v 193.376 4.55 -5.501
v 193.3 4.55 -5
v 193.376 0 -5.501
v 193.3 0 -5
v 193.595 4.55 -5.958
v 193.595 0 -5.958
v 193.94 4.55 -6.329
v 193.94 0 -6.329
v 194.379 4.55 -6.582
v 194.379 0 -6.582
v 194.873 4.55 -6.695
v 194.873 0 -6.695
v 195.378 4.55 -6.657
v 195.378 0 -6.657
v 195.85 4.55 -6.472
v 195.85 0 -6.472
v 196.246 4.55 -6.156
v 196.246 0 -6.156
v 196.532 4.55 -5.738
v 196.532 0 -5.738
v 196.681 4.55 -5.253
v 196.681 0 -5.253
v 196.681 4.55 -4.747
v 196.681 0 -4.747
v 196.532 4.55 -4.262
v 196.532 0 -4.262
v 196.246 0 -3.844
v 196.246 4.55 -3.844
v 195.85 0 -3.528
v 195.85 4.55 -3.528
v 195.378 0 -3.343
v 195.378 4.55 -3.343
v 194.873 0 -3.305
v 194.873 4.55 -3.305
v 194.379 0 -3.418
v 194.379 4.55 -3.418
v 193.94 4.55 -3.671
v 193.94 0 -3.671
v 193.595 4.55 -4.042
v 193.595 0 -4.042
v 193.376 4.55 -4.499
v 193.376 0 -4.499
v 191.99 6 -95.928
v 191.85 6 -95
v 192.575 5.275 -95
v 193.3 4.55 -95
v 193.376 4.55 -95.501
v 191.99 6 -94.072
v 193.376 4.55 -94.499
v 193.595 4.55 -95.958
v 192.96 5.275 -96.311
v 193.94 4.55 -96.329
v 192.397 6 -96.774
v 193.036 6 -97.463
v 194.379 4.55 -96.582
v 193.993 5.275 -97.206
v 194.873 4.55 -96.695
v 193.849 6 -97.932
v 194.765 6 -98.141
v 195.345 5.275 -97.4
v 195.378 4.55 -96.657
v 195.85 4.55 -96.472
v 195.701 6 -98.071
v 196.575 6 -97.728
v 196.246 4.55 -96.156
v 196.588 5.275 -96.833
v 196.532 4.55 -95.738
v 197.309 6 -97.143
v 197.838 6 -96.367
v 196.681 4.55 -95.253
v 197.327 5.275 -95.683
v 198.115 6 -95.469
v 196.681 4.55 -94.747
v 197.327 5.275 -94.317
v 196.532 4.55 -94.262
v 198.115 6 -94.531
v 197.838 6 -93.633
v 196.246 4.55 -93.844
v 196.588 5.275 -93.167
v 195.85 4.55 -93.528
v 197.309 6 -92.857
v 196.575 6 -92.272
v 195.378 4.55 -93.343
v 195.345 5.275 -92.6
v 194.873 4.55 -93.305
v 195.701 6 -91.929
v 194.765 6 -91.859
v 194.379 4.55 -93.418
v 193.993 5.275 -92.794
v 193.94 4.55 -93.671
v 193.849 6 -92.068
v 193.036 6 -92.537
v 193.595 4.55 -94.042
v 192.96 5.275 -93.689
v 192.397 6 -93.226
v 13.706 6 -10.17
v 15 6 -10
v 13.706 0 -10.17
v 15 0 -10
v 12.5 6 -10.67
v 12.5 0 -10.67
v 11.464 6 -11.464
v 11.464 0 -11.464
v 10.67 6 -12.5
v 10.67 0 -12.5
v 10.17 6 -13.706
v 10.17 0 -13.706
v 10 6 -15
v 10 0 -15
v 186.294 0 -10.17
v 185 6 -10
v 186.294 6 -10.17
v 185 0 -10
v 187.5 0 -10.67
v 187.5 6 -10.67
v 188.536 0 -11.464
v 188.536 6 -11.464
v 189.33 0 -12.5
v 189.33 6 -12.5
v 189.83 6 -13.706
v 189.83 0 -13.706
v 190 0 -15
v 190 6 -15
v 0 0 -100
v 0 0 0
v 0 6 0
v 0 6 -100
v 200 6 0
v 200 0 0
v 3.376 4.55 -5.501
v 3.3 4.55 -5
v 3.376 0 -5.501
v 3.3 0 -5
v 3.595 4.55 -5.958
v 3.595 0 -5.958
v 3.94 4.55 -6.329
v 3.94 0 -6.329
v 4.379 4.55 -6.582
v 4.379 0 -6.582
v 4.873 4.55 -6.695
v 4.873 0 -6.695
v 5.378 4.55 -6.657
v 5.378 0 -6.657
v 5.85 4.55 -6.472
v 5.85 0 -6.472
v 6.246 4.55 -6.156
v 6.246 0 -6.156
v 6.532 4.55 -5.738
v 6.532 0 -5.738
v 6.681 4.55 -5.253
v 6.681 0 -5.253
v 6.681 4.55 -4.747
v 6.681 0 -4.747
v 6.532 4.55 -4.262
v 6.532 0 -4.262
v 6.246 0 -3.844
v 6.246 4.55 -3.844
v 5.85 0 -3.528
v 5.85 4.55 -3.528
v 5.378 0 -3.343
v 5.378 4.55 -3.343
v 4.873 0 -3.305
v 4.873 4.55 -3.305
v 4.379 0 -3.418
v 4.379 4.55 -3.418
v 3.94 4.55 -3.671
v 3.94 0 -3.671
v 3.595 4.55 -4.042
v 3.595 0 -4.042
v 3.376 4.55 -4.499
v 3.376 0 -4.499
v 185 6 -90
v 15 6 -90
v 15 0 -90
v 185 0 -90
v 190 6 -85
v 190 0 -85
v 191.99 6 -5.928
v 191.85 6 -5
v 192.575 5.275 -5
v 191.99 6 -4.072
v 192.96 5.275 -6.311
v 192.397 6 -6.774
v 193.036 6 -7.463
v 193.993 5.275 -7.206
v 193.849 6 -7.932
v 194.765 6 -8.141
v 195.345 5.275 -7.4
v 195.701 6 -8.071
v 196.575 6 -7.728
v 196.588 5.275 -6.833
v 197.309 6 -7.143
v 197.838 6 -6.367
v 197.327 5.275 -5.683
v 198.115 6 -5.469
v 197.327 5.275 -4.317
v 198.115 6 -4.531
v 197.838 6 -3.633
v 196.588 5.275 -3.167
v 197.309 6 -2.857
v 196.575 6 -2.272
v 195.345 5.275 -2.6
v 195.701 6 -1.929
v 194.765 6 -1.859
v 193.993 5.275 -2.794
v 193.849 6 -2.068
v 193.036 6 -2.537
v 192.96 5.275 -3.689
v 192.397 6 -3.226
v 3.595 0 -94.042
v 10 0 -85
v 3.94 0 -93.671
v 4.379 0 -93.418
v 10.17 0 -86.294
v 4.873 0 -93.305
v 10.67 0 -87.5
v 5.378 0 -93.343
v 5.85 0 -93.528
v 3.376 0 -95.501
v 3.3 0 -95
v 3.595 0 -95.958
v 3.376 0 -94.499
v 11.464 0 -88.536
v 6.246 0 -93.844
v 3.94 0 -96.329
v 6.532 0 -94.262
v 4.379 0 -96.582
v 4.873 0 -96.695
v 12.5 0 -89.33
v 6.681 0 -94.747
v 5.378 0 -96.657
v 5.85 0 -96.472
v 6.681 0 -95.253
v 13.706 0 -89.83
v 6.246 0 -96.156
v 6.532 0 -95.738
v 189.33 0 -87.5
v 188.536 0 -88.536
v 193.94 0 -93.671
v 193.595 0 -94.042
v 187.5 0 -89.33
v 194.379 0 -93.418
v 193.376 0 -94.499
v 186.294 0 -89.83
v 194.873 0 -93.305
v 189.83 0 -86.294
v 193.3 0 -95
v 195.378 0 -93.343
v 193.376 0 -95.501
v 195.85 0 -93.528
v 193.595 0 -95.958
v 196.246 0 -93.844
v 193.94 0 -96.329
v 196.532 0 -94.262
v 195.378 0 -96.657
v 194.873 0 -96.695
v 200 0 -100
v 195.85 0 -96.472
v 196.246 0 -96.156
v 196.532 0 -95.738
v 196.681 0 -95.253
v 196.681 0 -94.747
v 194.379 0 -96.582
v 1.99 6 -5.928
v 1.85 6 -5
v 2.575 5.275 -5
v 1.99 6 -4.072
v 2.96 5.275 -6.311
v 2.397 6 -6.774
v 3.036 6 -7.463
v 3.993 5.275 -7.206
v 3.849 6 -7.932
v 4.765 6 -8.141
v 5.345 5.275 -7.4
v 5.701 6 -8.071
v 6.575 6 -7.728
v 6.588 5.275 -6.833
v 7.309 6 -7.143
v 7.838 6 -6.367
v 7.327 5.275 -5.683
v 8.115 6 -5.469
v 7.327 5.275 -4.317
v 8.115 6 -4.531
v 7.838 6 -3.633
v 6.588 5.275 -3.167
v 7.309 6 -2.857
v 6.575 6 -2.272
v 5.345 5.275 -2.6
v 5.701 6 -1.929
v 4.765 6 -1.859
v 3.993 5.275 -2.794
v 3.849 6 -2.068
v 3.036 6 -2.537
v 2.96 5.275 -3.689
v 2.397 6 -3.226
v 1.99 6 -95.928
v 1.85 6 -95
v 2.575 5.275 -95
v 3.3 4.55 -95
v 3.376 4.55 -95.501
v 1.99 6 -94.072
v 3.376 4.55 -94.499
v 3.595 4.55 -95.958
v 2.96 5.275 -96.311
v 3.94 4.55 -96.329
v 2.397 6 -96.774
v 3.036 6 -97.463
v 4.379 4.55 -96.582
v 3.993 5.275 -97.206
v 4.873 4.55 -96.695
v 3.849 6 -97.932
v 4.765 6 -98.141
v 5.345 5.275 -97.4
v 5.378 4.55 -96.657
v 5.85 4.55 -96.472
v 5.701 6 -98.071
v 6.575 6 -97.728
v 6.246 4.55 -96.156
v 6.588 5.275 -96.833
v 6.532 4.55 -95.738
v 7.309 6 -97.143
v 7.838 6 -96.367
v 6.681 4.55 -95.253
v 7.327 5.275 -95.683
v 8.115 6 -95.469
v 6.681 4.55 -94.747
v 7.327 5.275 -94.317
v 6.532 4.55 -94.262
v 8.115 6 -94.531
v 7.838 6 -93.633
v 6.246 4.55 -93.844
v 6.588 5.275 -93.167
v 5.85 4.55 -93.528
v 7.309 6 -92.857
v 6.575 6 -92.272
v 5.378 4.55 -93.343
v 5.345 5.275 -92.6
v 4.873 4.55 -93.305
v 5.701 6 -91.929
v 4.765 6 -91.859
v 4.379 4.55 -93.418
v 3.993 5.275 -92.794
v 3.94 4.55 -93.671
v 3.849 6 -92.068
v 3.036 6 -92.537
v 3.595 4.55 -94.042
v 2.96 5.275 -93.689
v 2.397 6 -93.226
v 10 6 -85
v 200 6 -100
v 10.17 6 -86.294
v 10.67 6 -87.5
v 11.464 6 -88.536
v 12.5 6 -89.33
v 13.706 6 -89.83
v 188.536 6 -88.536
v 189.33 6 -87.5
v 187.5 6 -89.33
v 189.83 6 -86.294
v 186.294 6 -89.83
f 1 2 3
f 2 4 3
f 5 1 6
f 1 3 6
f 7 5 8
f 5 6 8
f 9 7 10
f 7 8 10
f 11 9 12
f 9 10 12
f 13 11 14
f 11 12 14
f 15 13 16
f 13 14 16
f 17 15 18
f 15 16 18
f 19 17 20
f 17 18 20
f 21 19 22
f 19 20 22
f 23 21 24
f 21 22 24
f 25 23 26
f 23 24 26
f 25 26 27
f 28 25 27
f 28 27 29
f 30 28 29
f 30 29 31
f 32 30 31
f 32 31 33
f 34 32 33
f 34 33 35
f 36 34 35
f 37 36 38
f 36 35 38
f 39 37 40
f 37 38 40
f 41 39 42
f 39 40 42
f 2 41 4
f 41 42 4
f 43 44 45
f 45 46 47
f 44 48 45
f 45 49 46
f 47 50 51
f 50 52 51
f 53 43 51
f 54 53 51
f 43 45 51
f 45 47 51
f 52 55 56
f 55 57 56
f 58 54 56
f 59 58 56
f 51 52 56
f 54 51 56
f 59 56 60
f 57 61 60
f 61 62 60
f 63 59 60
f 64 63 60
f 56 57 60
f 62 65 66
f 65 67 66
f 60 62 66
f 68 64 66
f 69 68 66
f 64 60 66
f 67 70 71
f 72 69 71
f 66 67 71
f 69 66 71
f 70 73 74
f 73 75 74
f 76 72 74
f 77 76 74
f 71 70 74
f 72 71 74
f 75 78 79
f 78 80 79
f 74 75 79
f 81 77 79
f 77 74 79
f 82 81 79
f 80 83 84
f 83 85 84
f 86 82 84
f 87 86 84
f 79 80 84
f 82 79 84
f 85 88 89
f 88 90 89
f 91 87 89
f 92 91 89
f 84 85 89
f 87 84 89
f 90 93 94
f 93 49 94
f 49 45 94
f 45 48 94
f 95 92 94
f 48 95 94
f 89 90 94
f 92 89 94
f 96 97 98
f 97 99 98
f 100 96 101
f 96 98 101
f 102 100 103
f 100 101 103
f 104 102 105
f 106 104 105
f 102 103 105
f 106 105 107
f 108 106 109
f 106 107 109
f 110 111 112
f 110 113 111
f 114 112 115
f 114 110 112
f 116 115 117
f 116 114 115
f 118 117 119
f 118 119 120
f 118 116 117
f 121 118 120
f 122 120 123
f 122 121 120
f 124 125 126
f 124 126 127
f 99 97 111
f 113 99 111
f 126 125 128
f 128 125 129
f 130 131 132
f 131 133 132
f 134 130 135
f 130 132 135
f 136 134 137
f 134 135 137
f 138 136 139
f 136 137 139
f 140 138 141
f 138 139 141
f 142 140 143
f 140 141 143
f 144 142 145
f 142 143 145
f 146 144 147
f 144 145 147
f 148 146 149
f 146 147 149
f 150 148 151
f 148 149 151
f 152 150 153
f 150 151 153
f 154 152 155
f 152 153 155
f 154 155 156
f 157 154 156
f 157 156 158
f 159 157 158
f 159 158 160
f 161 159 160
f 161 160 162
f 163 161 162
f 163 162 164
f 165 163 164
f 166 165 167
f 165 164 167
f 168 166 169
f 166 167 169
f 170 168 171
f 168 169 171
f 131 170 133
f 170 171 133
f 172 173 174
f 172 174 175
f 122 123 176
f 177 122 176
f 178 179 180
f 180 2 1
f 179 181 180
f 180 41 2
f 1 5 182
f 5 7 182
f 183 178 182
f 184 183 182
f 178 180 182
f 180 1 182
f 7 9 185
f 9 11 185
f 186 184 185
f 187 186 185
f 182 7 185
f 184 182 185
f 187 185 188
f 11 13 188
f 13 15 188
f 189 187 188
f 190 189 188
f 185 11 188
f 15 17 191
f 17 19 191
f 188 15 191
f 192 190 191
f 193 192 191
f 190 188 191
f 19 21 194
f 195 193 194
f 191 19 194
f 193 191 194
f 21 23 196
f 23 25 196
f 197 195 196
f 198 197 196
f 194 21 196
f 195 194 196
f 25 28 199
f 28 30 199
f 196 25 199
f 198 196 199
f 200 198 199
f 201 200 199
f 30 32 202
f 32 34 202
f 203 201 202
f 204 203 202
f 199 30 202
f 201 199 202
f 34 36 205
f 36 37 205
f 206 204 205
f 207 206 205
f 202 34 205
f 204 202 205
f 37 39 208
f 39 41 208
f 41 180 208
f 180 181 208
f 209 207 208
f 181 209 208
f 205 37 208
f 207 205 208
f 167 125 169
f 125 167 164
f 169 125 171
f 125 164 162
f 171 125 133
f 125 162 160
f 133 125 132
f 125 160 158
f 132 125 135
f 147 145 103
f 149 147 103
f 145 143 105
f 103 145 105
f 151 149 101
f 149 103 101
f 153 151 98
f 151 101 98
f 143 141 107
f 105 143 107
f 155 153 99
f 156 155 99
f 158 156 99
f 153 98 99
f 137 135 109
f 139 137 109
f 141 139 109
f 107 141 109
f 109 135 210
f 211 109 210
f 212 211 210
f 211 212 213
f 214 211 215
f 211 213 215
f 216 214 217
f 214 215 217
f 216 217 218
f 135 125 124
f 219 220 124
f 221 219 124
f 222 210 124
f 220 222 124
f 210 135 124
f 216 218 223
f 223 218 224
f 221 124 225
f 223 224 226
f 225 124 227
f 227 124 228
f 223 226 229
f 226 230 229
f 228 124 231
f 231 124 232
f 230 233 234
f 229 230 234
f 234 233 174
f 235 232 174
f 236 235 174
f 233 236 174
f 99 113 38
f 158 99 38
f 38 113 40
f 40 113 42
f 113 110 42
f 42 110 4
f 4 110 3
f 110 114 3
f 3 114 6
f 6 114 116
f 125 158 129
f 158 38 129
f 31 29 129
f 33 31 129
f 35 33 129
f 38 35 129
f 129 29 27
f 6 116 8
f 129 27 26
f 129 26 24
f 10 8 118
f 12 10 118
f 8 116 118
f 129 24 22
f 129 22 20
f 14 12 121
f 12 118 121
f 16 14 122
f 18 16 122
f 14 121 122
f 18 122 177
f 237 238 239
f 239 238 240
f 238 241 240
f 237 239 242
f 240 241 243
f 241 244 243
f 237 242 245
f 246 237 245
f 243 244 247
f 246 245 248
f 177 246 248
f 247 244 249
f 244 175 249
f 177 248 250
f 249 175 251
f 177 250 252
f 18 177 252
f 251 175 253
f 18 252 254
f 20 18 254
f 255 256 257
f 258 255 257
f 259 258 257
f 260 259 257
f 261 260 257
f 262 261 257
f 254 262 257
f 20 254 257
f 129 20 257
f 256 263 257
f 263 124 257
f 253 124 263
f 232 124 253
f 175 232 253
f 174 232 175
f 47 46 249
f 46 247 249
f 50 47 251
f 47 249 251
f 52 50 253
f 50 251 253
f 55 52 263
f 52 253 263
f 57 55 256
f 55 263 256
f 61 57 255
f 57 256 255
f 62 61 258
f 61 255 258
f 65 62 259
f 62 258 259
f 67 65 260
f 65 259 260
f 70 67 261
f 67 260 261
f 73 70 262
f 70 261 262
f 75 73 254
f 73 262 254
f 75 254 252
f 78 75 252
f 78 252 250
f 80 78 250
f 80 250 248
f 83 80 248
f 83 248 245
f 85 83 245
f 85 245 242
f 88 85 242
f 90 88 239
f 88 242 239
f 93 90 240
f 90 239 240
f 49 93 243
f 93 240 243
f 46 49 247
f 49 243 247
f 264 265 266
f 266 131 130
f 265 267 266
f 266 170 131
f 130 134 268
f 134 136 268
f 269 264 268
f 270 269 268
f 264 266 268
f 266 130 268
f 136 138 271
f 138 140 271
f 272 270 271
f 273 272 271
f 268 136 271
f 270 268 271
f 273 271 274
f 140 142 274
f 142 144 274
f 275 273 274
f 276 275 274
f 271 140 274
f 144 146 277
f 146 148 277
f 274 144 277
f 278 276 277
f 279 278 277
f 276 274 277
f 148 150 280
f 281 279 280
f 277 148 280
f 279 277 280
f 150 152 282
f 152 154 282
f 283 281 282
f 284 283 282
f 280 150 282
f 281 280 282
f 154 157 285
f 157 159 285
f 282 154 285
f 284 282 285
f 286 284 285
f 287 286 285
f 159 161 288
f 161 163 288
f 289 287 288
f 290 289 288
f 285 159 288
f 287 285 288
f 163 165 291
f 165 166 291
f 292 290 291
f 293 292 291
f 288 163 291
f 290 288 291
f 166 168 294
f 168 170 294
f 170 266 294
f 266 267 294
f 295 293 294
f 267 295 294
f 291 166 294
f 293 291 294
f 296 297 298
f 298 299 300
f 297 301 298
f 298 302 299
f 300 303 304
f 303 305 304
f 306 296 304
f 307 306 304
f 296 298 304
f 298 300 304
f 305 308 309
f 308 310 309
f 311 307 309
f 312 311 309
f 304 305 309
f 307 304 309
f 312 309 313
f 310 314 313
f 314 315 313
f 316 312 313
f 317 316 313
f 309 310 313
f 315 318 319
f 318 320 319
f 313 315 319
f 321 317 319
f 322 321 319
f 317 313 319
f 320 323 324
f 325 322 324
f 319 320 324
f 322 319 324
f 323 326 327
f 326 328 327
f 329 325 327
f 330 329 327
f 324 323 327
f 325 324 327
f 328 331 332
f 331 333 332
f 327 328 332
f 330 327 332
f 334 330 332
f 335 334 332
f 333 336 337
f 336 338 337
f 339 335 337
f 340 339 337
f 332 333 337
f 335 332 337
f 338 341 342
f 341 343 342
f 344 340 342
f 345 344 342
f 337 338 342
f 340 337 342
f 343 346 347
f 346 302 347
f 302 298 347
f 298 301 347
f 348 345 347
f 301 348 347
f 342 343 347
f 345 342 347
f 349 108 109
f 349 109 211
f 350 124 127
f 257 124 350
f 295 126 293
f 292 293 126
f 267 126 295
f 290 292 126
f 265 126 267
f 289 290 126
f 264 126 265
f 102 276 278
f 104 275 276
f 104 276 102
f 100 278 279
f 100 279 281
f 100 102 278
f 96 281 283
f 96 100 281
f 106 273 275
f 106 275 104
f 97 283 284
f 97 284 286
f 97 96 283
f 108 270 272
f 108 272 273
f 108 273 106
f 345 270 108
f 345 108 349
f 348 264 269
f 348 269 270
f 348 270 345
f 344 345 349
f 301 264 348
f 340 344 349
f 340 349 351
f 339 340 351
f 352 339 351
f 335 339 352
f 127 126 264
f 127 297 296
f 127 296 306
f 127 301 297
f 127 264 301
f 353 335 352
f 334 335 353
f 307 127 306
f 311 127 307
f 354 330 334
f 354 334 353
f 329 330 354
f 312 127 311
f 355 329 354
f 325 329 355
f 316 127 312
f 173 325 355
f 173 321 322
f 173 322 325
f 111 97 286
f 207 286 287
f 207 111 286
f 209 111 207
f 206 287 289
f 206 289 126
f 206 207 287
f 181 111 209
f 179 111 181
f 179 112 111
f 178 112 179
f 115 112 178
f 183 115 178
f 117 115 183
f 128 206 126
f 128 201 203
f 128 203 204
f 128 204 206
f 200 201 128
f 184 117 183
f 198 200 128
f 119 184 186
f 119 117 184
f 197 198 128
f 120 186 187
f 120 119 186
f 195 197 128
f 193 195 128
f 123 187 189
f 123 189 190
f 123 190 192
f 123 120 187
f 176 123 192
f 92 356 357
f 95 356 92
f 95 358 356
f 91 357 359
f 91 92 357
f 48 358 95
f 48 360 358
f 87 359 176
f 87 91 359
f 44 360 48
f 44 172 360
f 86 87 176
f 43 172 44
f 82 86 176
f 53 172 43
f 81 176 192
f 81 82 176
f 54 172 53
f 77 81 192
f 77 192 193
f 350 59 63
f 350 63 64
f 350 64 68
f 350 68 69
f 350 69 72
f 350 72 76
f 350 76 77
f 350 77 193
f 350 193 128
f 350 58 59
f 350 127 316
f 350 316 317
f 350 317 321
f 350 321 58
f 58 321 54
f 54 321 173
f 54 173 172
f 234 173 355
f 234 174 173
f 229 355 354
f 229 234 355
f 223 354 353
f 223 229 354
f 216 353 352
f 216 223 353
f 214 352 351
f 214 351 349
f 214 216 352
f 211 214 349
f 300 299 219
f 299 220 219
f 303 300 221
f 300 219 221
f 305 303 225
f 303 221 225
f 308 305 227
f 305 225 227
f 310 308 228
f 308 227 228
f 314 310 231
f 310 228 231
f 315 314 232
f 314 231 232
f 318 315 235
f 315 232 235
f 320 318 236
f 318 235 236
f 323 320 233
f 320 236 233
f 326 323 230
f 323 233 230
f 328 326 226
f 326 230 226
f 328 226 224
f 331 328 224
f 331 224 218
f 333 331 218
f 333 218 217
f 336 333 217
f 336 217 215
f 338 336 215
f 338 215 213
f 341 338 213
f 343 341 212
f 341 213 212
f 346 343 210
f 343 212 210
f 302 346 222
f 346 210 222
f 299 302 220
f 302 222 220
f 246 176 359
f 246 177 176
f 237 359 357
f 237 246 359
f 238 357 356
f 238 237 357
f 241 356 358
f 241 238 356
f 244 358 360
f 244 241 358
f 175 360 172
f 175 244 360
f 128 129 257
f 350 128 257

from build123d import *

# Parameters (mm, degrees)
SKETCH1_W                                           = 200
SKETCH1_H                                           = 100
BOSS_EXTRUDE1_DEPTH                                 = 6
SKETCH2_W                                           = 180
SKETCH2_H                                           = 80
CUT_EXTRUDE1_DEPTH                                  = 224.687281713
FILLET1_R                                           = 5
CSK_FOR_M3_COUNTERSUNK_FLAT_HEAD_SCREW1_D           = 3.4
CSK_FOR_M3_COUNTERSUNK_FLAT_HEAD_SCREW1_CSINK_D     = 6.3
CSK_FOR_M3_COUNTERSUNK_FLAT_HEAD_SCREW1_CSINK_ANGLE = 90


with BuildPart() as part:
    # Sketch1 → Boss-Extrude1 (new body)
    with BuildSketch(Plane(origin=(0, 0, 0), x_dir=(1, 0, 0), z_dir=(0, 1, 0))):
        with Locations((100, 50)):
            Rectangle(SKETCH1_W, SKETCH1_H)
    extrude(amount=BOSS_EXTRUDE1_DEPTH)

    # Sketch2 → Cut-Extrude1 (cut, through all)
    with BuildSketch(Plane(origin=(0, 6, 0), x_dir=(1, 0, 0), z_dir=(0, 1, 0))):
        with Locations((100, 50)):
            Rectangle(SKETCH2_W, SKETCH2_H)
    extrude(amount=-CUT_EXTRUDE1_DEPTH, mode=Mode.SUBTRACT)

    # Fillet1
    fillet1_edges = [part.edges().sort_by_distance(p)[0] for p in [
        (10, 3, -10),
        (10, 3, -90),
        (190, 3, -90),
        (190, 3, -10),
    ]]
    fillet(fillet1_edges, radius=FILLET1_R)

    # CSK for M3 Countersunk Flat Head Screw1 (through all)
    with Locations(Plane(origin=(0, 6, 0), x_dir=(1, 0, 0), z_dir=(0, 1, 0))):
        with Locations((5, 5), (5, 95), (195, 95), (195, 5)):
            CounterSinkHole(CSK_FOR_M3_COUNTERSUNK_FLAT_HEAD_SCREW1_D / 2, CSK_FOR_M3_COUNTERSUNK_FLAT_HEAD_SCREW1_CSINK_D / 2, counter_sink_angle=CSK_FOR_M3_COUNTERSUNK_FLAT_HEAD_SCREW1_CSINK_ANGLE)


solid = part.part
